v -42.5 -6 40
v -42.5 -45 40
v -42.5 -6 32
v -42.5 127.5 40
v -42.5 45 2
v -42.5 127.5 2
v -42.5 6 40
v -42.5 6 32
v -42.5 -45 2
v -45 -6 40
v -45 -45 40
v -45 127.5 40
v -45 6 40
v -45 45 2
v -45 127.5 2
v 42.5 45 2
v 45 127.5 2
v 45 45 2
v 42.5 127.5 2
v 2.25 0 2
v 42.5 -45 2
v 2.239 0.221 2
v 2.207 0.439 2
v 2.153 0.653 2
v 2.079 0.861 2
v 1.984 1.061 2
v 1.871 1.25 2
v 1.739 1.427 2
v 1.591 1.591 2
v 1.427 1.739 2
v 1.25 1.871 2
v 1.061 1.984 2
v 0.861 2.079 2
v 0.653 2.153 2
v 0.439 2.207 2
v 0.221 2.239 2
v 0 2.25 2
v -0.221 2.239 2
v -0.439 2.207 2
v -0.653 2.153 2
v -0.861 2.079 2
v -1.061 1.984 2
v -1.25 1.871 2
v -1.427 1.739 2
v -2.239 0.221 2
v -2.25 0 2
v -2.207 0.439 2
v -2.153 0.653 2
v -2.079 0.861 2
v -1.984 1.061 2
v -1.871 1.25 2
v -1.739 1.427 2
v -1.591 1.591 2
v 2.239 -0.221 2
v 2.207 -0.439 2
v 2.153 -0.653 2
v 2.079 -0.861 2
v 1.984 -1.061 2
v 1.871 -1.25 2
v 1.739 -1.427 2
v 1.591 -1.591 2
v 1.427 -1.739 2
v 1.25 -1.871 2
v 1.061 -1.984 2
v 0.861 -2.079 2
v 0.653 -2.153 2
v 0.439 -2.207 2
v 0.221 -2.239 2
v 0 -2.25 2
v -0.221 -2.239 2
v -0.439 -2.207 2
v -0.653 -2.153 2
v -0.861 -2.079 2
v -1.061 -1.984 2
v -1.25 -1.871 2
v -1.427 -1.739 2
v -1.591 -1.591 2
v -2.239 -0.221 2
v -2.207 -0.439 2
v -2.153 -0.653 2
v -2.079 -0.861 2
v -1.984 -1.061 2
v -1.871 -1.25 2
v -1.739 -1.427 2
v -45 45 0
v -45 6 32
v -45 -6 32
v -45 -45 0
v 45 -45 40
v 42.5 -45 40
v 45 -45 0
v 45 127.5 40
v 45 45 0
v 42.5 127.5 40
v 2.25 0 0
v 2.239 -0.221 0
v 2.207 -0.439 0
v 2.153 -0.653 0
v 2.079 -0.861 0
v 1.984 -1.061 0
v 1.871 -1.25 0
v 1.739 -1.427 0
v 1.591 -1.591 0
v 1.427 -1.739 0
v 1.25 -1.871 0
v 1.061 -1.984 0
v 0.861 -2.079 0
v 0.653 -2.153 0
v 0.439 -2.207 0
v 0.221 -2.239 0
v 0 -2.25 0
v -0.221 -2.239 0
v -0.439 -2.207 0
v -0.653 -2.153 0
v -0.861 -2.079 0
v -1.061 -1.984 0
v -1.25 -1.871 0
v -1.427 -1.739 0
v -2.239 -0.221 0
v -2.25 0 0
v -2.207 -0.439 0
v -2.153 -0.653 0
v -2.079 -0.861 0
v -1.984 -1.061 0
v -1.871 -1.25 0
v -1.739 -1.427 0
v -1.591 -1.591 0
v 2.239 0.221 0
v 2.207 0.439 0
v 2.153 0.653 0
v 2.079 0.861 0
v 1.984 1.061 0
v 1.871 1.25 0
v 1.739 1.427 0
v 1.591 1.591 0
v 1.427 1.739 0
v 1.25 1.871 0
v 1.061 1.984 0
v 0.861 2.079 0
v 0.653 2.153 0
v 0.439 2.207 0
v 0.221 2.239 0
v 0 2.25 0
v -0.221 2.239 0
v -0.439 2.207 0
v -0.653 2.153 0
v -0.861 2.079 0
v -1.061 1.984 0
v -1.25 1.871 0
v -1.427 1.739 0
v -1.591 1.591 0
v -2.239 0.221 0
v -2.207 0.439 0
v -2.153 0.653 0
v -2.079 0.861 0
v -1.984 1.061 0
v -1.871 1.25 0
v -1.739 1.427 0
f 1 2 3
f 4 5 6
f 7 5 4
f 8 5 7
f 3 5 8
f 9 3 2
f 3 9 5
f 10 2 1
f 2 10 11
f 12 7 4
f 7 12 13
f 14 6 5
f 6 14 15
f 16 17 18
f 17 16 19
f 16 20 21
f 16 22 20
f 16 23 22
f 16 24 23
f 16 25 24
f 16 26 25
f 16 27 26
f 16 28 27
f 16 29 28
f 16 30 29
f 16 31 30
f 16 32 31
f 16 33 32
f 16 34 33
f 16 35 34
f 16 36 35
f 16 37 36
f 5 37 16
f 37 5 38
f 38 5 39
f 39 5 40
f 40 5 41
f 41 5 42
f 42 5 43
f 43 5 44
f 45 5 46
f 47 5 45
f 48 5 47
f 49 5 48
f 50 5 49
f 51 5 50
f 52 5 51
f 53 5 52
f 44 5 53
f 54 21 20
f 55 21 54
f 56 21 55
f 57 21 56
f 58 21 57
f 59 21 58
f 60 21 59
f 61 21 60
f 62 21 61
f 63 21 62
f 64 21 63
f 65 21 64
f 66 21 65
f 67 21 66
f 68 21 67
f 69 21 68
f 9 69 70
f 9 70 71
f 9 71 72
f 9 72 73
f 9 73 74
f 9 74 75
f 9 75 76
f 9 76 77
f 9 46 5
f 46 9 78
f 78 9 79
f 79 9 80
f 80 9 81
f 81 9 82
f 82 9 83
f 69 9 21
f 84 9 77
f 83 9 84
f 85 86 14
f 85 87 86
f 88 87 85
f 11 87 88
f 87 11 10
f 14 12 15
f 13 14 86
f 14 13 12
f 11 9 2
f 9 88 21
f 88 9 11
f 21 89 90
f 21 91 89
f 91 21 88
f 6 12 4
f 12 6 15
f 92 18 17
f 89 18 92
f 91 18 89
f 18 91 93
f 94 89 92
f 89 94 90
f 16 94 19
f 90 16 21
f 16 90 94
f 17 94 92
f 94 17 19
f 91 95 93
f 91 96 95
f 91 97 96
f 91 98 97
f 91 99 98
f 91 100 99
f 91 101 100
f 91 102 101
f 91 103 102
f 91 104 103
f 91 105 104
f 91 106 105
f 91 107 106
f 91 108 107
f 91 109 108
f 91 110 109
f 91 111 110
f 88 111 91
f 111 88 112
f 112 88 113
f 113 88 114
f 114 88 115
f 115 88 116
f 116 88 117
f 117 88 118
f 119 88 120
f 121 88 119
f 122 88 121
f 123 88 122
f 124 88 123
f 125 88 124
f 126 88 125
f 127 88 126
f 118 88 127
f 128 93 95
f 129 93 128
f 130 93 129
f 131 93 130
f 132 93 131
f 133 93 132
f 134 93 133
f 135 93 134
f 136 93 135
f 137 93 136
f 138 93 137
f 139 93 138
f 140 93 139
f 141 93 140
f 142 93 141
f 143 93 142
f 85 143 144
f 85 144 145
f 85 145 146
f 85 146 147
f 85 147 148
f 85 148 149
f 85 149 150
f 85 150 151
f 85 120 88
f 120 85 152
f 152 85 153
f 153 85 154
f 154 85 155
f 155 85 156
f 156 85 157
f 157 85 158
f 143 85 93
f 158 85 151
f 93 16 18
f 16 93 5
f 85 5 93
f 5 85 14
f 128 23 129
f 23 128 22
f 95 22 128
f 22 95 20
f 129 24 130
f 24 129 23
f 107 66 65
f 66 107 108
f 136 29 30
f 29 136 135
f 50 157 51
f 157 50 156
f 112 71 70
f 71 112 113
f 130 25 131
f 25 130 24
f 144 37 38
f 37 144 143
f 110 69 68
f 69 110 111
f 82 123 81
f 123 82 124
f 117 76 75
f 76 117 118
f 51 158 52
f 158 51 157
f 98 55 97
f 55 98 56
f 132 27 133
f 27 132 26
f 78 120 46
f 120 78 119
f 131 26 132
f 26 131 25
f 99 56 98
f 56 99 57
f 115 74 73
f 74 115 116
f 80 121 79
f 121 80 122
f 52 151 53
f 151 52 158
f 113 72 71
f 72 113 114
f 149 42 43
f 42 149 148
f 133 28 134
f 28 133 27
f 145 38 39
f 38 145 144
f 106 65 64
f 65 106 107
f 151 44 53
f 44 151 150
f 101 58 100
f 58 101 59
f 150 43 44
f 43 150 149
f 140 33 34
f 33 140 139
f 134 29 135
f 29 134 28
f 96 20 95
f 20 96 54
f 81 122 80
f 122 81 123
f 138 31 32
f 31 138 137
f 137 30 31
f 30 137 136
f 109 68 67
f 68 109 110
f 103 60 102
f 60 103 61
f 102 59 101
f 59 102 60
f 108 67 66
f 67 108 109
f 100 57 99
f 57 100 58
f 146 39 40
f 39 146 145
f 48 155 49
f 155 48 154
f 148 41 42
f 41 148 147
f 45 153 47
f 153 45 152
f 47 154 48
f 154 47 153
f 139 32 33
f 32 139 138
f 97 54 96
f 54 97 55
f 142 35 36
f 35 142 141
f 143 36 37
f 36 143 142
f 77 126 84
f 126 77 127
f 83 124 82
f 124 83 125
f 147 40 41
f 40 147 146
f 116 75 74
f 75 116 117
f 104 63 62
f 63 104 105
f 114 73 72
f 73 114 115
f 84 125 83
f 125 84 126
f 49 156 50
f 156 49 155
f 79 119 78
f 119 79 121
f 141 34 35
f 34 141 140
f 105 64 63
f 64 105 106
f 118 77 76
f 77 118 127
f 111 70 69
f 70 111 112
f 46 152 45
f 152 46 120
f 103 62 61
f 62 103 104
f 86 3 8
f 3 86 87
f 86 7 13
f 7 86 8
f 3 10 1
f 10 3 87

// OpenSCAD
// Magnetic stirrer housing (print orientation: upside down)
// Units: mm

$fn = 64;

// --- Dimensions ---
top_thickness = 2;      // top plate thickness (z = 0 to 2)
wall_thickness = 2.5;   // wall thickness (z = 2 to 40)
box_height = 40;        // total height of box (open edge at z = 40)
outer_size = 90;        // outer size in X and Y
hole_pitch = 71.5;      // square pattern pitch for M4 screw holes
hole_d = 4.5;           // M4 screw hole diameter
notch_width = 12;       // cable notch width
notch_depth = 8;        // cable notch depth from open edge (z = 32 to 40)
eps = 0.5;              // cutter overshoot past faces

// --- Model ---
difference() {
    // Main body: top plate + four walls, open top
    union() {
        // Top plate
        translate([-outer_size/2, -outer_size/2, 0])
            cube([outer_size, outer_size, top_thickness]);
        // Walls (rise from z = top_thickness to z = box_height)
        for (x = [-1, 1], y = [-1, 1])
            translate([x > 0 ? outer_size/2 - wall_thickness : -outer_size/2,
                       y > 0 ? outer_size/2 - wall_thickness : -outer_size/2,
                       top_thickness])
                cube([wall_thickness, outer_size - 2*(y > 0 ? wall_thickness : 0),
                      box_height - top_thickness]);
    }

    // Screw holes through top plate
    for (i = [0, 1, 2, 3]) {
        angle = 90 * i;
        translate([0, 0, -eps])
            rotate([0, 0, angle])
                cylinder(d = hole_d, h = top_thickness + 2*eps);
    }

    // Cable notch in one wall (centred along the wall, open edge at z = box_height)
    translate([-outer_size/2 - eps, -notch_width/2, box_height - notch_depth])
        cube([outer_size/2 + eps, notch_width, notch_depth + eps]);
}
